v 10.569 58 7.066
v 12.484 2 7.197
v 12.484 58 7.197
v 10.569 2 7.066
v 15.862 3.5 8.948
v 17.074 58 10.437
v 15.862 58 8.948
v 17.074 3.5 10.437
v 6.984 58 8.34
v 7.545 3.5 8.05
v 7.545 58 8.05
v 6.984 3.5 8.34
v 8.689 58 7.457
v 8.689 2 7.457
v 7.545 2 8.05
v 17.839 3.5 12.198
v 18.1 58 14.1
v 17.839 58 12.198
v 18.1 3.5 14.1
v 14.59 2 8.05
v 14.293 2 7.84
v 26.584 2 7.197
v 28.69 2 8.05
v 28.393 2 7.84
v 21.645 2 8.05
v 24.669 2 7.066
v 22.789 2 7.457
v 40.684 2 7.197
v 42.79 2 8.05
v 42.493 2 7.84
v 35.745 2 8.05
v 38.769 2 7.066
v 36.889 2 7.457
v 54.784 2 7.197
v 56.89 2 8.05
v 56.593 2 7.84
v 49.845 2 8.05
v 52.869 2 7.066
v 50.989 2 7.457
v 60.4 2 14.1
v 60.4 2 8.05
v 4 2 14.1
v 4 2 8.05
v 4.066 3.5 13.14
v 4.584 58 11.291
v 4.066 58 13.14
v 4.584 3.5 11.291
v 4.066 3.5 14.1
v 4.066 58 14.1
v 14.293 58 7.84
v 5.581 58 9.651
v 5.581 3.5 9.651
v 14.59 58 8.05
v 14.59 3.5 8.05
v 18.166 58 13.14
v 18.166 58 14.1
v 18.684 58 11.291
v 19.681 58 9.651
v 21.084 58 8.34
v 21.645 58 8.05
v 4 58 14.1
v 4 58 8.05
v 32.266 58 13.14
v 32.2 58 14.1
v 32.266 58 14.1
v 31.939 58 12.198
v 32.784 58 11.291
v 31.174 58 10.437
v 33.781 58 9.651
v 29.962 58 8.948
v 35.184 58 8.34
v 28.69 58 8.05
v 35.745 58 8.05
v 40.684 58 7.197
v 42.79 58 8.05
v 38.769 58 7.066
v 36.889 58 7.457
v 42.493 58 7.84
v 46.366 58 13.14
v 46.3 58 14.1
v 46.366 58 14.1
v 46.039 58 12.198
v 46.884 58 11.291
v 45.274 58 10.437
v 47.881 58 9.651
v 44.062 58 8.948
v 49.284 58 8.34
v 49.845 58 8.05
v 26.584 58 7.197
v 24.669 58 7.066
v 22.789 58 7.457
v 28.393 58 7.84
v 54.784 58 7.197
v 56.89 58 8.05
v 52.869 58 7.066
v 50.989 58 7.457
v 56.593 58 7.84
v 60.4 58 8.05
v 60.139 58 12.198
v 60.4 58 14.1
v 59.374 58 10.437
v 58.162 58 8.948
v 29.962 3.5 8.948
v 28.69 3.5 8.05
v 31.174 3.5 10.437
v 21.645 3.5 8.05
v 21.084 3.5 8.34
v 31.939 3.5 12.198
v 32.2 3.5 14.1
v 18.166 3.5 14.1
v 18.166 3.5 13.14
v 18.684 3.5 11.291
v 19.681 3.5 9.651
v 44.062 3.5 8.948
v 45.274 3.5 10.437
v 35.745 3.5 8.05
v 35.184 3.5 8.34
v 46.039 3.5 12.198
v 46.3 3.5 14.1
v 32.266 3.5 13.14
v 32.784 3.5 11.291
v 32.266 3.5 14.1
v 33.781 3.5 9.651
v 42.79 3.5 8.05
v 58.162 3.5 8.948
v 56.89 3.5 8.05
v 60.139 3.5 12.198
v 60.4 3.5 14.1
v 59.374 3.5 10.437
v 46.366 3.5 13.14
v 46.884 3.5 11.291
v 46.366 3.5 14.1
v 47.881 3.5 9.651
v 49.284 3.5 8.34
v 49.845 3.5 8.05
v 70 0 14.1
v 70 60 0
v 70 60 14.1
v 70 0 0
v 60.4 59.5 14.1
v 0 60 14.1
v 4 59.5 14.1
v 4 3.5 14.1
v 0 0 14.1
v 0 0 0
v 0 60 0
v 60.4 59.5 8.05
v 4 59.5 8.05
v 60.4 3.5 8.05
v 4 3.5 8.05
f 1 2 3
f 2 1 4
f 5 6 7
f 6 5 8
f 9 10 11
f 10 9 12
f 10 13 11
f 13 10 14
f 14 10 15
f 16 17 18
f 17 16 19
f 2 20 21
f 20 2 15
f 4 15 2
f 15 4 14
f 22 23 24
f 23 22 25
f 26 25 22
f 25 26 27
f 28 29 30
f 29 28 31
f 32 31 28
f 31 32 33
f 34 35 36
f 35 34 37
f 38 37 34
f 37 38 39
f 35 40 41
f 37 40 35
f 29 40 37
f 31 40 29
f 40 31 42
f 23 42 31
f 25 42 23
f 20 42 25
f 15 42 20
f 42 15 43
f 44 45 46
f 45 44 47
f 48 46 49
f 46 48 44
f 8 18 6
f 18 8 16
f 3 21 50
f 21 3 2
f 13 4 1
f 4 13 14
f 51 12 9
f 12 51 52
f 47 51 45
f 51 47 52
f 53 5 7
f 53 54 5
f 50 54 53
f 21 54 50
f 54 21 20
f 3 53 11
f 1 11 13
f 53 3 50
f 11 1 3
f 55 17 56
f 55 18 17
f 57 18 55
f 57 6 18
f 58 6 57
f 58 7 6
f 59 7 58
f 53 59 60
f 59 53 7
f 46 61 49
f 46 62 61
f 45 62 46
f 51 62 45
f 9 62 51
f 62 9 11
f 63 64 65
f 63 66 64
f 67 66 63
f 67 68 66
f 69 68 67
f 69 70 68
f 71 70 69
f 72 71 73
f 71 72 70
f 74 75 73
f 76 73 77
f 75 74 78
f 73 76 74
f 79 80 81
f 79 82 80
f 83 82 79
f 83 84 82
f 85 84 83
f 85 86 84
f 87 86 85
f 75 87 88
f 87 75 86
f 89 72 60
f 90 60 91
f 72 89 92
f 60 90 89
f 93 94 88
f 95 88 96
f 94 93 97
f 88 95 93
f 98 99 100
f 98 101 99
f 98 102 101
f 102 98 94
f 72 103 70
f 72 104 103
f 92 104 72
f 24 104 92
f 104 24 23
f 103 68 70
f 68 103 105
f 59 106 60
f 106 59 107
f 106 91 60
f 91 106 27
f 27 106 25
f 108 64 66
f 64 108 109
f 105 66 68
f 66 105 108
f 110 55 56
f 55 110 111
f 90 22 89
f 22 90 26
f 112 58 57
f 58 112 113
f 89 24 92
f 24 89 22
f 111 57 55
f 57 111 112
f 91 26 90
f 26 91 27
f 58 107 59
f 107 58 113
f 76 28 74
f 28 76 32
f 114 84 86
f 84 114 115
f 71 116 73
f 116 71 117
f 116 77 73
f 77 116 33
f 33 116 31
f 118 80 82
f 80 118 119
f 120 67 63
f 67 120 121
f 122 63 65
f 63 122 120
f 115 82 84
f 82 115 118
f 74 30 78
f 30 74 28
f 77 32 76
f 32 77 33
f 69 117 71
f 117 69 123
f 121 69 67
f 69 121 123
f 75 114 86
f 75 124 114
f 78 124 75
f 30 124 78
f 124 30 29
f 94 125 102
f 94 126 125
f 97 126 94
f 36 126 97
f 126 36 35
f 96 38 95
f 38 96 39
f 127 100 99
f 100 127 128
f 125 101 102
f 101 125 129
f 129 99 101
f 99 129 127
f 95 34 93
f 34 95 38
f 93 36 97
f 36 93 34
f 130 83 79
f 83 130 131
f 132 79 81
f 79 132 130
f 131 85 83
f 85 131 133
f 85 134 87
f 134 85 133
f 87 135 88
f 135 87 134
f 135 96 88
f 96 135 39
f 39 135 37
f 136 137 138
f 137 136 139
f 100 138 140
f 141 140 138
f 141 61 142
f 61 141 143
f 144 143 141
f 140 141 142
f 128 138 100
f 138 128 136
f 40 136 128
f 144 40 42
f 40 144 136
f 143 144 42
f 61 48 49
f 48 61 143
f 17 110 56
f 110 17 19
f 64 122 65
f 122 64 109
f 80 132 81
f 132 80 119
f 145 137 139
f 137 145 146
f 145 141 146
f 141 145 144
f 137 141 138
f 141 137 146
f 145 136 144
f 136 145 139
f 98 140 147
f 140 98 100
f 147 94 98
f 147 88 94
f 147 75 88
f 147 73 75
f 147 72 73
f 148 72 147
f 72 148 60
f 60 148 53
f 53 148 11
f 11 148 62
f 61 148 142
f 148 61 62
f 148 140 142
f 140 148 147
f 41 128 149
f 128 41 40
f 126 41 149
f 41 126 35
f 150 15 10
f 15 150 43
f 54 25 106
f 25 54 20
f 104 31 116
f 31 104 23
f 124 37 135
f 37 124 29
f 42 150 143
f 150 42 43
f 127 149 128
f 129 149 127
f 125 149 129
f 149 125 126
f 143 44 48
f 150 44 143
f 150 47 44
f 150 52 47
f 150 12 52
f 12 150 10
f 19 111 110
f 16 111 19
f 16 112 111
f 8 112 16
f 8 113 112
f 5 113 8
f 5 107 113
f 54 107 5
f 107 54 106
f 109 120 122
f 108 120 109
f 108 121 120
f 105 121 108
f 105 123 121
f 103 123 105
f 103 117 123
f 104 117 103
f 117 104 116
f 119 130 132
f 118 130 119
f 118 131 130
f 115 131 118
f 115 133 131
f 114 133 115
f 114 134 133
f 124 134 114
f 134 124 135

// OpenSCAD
AA_width = 14.1;
AA_height = 51;
contact_height = 12;
contact1x_width = 12;
contact2x_width = 26.5;
contact_clearance = 5;
spring_height = 8.5;
block_width = 70;
block_height = 60;

cutout_height = AA_height + contact_clearance;
difference(){
    //main block
    cube([block_width, block_height, AA_width]);
    //battery cutouts
    translate([+2, block_height - (block_height-cutout_height)/2, AA_width])
    rotate([90, 0, 0]){
        for(i=[0:3]){
            translate([i*AA_width+AA_width/2+2, 0, 0]){
                cylinder(h = cutout_height, r = AA_width/2, center = false);
            }
        }
    }
    //contact cutouts
    translate([+4, block_height - (block_height - cutout_height)/2, AA_width/2+1])
        cube([4*AA_width, 1.5, AA_width/2]);
    translate([+4, (block_height - cutout_height)/2, AA_width/2+1])
        cube([4*AA_width, 1.5, AA_width/2]);
}
